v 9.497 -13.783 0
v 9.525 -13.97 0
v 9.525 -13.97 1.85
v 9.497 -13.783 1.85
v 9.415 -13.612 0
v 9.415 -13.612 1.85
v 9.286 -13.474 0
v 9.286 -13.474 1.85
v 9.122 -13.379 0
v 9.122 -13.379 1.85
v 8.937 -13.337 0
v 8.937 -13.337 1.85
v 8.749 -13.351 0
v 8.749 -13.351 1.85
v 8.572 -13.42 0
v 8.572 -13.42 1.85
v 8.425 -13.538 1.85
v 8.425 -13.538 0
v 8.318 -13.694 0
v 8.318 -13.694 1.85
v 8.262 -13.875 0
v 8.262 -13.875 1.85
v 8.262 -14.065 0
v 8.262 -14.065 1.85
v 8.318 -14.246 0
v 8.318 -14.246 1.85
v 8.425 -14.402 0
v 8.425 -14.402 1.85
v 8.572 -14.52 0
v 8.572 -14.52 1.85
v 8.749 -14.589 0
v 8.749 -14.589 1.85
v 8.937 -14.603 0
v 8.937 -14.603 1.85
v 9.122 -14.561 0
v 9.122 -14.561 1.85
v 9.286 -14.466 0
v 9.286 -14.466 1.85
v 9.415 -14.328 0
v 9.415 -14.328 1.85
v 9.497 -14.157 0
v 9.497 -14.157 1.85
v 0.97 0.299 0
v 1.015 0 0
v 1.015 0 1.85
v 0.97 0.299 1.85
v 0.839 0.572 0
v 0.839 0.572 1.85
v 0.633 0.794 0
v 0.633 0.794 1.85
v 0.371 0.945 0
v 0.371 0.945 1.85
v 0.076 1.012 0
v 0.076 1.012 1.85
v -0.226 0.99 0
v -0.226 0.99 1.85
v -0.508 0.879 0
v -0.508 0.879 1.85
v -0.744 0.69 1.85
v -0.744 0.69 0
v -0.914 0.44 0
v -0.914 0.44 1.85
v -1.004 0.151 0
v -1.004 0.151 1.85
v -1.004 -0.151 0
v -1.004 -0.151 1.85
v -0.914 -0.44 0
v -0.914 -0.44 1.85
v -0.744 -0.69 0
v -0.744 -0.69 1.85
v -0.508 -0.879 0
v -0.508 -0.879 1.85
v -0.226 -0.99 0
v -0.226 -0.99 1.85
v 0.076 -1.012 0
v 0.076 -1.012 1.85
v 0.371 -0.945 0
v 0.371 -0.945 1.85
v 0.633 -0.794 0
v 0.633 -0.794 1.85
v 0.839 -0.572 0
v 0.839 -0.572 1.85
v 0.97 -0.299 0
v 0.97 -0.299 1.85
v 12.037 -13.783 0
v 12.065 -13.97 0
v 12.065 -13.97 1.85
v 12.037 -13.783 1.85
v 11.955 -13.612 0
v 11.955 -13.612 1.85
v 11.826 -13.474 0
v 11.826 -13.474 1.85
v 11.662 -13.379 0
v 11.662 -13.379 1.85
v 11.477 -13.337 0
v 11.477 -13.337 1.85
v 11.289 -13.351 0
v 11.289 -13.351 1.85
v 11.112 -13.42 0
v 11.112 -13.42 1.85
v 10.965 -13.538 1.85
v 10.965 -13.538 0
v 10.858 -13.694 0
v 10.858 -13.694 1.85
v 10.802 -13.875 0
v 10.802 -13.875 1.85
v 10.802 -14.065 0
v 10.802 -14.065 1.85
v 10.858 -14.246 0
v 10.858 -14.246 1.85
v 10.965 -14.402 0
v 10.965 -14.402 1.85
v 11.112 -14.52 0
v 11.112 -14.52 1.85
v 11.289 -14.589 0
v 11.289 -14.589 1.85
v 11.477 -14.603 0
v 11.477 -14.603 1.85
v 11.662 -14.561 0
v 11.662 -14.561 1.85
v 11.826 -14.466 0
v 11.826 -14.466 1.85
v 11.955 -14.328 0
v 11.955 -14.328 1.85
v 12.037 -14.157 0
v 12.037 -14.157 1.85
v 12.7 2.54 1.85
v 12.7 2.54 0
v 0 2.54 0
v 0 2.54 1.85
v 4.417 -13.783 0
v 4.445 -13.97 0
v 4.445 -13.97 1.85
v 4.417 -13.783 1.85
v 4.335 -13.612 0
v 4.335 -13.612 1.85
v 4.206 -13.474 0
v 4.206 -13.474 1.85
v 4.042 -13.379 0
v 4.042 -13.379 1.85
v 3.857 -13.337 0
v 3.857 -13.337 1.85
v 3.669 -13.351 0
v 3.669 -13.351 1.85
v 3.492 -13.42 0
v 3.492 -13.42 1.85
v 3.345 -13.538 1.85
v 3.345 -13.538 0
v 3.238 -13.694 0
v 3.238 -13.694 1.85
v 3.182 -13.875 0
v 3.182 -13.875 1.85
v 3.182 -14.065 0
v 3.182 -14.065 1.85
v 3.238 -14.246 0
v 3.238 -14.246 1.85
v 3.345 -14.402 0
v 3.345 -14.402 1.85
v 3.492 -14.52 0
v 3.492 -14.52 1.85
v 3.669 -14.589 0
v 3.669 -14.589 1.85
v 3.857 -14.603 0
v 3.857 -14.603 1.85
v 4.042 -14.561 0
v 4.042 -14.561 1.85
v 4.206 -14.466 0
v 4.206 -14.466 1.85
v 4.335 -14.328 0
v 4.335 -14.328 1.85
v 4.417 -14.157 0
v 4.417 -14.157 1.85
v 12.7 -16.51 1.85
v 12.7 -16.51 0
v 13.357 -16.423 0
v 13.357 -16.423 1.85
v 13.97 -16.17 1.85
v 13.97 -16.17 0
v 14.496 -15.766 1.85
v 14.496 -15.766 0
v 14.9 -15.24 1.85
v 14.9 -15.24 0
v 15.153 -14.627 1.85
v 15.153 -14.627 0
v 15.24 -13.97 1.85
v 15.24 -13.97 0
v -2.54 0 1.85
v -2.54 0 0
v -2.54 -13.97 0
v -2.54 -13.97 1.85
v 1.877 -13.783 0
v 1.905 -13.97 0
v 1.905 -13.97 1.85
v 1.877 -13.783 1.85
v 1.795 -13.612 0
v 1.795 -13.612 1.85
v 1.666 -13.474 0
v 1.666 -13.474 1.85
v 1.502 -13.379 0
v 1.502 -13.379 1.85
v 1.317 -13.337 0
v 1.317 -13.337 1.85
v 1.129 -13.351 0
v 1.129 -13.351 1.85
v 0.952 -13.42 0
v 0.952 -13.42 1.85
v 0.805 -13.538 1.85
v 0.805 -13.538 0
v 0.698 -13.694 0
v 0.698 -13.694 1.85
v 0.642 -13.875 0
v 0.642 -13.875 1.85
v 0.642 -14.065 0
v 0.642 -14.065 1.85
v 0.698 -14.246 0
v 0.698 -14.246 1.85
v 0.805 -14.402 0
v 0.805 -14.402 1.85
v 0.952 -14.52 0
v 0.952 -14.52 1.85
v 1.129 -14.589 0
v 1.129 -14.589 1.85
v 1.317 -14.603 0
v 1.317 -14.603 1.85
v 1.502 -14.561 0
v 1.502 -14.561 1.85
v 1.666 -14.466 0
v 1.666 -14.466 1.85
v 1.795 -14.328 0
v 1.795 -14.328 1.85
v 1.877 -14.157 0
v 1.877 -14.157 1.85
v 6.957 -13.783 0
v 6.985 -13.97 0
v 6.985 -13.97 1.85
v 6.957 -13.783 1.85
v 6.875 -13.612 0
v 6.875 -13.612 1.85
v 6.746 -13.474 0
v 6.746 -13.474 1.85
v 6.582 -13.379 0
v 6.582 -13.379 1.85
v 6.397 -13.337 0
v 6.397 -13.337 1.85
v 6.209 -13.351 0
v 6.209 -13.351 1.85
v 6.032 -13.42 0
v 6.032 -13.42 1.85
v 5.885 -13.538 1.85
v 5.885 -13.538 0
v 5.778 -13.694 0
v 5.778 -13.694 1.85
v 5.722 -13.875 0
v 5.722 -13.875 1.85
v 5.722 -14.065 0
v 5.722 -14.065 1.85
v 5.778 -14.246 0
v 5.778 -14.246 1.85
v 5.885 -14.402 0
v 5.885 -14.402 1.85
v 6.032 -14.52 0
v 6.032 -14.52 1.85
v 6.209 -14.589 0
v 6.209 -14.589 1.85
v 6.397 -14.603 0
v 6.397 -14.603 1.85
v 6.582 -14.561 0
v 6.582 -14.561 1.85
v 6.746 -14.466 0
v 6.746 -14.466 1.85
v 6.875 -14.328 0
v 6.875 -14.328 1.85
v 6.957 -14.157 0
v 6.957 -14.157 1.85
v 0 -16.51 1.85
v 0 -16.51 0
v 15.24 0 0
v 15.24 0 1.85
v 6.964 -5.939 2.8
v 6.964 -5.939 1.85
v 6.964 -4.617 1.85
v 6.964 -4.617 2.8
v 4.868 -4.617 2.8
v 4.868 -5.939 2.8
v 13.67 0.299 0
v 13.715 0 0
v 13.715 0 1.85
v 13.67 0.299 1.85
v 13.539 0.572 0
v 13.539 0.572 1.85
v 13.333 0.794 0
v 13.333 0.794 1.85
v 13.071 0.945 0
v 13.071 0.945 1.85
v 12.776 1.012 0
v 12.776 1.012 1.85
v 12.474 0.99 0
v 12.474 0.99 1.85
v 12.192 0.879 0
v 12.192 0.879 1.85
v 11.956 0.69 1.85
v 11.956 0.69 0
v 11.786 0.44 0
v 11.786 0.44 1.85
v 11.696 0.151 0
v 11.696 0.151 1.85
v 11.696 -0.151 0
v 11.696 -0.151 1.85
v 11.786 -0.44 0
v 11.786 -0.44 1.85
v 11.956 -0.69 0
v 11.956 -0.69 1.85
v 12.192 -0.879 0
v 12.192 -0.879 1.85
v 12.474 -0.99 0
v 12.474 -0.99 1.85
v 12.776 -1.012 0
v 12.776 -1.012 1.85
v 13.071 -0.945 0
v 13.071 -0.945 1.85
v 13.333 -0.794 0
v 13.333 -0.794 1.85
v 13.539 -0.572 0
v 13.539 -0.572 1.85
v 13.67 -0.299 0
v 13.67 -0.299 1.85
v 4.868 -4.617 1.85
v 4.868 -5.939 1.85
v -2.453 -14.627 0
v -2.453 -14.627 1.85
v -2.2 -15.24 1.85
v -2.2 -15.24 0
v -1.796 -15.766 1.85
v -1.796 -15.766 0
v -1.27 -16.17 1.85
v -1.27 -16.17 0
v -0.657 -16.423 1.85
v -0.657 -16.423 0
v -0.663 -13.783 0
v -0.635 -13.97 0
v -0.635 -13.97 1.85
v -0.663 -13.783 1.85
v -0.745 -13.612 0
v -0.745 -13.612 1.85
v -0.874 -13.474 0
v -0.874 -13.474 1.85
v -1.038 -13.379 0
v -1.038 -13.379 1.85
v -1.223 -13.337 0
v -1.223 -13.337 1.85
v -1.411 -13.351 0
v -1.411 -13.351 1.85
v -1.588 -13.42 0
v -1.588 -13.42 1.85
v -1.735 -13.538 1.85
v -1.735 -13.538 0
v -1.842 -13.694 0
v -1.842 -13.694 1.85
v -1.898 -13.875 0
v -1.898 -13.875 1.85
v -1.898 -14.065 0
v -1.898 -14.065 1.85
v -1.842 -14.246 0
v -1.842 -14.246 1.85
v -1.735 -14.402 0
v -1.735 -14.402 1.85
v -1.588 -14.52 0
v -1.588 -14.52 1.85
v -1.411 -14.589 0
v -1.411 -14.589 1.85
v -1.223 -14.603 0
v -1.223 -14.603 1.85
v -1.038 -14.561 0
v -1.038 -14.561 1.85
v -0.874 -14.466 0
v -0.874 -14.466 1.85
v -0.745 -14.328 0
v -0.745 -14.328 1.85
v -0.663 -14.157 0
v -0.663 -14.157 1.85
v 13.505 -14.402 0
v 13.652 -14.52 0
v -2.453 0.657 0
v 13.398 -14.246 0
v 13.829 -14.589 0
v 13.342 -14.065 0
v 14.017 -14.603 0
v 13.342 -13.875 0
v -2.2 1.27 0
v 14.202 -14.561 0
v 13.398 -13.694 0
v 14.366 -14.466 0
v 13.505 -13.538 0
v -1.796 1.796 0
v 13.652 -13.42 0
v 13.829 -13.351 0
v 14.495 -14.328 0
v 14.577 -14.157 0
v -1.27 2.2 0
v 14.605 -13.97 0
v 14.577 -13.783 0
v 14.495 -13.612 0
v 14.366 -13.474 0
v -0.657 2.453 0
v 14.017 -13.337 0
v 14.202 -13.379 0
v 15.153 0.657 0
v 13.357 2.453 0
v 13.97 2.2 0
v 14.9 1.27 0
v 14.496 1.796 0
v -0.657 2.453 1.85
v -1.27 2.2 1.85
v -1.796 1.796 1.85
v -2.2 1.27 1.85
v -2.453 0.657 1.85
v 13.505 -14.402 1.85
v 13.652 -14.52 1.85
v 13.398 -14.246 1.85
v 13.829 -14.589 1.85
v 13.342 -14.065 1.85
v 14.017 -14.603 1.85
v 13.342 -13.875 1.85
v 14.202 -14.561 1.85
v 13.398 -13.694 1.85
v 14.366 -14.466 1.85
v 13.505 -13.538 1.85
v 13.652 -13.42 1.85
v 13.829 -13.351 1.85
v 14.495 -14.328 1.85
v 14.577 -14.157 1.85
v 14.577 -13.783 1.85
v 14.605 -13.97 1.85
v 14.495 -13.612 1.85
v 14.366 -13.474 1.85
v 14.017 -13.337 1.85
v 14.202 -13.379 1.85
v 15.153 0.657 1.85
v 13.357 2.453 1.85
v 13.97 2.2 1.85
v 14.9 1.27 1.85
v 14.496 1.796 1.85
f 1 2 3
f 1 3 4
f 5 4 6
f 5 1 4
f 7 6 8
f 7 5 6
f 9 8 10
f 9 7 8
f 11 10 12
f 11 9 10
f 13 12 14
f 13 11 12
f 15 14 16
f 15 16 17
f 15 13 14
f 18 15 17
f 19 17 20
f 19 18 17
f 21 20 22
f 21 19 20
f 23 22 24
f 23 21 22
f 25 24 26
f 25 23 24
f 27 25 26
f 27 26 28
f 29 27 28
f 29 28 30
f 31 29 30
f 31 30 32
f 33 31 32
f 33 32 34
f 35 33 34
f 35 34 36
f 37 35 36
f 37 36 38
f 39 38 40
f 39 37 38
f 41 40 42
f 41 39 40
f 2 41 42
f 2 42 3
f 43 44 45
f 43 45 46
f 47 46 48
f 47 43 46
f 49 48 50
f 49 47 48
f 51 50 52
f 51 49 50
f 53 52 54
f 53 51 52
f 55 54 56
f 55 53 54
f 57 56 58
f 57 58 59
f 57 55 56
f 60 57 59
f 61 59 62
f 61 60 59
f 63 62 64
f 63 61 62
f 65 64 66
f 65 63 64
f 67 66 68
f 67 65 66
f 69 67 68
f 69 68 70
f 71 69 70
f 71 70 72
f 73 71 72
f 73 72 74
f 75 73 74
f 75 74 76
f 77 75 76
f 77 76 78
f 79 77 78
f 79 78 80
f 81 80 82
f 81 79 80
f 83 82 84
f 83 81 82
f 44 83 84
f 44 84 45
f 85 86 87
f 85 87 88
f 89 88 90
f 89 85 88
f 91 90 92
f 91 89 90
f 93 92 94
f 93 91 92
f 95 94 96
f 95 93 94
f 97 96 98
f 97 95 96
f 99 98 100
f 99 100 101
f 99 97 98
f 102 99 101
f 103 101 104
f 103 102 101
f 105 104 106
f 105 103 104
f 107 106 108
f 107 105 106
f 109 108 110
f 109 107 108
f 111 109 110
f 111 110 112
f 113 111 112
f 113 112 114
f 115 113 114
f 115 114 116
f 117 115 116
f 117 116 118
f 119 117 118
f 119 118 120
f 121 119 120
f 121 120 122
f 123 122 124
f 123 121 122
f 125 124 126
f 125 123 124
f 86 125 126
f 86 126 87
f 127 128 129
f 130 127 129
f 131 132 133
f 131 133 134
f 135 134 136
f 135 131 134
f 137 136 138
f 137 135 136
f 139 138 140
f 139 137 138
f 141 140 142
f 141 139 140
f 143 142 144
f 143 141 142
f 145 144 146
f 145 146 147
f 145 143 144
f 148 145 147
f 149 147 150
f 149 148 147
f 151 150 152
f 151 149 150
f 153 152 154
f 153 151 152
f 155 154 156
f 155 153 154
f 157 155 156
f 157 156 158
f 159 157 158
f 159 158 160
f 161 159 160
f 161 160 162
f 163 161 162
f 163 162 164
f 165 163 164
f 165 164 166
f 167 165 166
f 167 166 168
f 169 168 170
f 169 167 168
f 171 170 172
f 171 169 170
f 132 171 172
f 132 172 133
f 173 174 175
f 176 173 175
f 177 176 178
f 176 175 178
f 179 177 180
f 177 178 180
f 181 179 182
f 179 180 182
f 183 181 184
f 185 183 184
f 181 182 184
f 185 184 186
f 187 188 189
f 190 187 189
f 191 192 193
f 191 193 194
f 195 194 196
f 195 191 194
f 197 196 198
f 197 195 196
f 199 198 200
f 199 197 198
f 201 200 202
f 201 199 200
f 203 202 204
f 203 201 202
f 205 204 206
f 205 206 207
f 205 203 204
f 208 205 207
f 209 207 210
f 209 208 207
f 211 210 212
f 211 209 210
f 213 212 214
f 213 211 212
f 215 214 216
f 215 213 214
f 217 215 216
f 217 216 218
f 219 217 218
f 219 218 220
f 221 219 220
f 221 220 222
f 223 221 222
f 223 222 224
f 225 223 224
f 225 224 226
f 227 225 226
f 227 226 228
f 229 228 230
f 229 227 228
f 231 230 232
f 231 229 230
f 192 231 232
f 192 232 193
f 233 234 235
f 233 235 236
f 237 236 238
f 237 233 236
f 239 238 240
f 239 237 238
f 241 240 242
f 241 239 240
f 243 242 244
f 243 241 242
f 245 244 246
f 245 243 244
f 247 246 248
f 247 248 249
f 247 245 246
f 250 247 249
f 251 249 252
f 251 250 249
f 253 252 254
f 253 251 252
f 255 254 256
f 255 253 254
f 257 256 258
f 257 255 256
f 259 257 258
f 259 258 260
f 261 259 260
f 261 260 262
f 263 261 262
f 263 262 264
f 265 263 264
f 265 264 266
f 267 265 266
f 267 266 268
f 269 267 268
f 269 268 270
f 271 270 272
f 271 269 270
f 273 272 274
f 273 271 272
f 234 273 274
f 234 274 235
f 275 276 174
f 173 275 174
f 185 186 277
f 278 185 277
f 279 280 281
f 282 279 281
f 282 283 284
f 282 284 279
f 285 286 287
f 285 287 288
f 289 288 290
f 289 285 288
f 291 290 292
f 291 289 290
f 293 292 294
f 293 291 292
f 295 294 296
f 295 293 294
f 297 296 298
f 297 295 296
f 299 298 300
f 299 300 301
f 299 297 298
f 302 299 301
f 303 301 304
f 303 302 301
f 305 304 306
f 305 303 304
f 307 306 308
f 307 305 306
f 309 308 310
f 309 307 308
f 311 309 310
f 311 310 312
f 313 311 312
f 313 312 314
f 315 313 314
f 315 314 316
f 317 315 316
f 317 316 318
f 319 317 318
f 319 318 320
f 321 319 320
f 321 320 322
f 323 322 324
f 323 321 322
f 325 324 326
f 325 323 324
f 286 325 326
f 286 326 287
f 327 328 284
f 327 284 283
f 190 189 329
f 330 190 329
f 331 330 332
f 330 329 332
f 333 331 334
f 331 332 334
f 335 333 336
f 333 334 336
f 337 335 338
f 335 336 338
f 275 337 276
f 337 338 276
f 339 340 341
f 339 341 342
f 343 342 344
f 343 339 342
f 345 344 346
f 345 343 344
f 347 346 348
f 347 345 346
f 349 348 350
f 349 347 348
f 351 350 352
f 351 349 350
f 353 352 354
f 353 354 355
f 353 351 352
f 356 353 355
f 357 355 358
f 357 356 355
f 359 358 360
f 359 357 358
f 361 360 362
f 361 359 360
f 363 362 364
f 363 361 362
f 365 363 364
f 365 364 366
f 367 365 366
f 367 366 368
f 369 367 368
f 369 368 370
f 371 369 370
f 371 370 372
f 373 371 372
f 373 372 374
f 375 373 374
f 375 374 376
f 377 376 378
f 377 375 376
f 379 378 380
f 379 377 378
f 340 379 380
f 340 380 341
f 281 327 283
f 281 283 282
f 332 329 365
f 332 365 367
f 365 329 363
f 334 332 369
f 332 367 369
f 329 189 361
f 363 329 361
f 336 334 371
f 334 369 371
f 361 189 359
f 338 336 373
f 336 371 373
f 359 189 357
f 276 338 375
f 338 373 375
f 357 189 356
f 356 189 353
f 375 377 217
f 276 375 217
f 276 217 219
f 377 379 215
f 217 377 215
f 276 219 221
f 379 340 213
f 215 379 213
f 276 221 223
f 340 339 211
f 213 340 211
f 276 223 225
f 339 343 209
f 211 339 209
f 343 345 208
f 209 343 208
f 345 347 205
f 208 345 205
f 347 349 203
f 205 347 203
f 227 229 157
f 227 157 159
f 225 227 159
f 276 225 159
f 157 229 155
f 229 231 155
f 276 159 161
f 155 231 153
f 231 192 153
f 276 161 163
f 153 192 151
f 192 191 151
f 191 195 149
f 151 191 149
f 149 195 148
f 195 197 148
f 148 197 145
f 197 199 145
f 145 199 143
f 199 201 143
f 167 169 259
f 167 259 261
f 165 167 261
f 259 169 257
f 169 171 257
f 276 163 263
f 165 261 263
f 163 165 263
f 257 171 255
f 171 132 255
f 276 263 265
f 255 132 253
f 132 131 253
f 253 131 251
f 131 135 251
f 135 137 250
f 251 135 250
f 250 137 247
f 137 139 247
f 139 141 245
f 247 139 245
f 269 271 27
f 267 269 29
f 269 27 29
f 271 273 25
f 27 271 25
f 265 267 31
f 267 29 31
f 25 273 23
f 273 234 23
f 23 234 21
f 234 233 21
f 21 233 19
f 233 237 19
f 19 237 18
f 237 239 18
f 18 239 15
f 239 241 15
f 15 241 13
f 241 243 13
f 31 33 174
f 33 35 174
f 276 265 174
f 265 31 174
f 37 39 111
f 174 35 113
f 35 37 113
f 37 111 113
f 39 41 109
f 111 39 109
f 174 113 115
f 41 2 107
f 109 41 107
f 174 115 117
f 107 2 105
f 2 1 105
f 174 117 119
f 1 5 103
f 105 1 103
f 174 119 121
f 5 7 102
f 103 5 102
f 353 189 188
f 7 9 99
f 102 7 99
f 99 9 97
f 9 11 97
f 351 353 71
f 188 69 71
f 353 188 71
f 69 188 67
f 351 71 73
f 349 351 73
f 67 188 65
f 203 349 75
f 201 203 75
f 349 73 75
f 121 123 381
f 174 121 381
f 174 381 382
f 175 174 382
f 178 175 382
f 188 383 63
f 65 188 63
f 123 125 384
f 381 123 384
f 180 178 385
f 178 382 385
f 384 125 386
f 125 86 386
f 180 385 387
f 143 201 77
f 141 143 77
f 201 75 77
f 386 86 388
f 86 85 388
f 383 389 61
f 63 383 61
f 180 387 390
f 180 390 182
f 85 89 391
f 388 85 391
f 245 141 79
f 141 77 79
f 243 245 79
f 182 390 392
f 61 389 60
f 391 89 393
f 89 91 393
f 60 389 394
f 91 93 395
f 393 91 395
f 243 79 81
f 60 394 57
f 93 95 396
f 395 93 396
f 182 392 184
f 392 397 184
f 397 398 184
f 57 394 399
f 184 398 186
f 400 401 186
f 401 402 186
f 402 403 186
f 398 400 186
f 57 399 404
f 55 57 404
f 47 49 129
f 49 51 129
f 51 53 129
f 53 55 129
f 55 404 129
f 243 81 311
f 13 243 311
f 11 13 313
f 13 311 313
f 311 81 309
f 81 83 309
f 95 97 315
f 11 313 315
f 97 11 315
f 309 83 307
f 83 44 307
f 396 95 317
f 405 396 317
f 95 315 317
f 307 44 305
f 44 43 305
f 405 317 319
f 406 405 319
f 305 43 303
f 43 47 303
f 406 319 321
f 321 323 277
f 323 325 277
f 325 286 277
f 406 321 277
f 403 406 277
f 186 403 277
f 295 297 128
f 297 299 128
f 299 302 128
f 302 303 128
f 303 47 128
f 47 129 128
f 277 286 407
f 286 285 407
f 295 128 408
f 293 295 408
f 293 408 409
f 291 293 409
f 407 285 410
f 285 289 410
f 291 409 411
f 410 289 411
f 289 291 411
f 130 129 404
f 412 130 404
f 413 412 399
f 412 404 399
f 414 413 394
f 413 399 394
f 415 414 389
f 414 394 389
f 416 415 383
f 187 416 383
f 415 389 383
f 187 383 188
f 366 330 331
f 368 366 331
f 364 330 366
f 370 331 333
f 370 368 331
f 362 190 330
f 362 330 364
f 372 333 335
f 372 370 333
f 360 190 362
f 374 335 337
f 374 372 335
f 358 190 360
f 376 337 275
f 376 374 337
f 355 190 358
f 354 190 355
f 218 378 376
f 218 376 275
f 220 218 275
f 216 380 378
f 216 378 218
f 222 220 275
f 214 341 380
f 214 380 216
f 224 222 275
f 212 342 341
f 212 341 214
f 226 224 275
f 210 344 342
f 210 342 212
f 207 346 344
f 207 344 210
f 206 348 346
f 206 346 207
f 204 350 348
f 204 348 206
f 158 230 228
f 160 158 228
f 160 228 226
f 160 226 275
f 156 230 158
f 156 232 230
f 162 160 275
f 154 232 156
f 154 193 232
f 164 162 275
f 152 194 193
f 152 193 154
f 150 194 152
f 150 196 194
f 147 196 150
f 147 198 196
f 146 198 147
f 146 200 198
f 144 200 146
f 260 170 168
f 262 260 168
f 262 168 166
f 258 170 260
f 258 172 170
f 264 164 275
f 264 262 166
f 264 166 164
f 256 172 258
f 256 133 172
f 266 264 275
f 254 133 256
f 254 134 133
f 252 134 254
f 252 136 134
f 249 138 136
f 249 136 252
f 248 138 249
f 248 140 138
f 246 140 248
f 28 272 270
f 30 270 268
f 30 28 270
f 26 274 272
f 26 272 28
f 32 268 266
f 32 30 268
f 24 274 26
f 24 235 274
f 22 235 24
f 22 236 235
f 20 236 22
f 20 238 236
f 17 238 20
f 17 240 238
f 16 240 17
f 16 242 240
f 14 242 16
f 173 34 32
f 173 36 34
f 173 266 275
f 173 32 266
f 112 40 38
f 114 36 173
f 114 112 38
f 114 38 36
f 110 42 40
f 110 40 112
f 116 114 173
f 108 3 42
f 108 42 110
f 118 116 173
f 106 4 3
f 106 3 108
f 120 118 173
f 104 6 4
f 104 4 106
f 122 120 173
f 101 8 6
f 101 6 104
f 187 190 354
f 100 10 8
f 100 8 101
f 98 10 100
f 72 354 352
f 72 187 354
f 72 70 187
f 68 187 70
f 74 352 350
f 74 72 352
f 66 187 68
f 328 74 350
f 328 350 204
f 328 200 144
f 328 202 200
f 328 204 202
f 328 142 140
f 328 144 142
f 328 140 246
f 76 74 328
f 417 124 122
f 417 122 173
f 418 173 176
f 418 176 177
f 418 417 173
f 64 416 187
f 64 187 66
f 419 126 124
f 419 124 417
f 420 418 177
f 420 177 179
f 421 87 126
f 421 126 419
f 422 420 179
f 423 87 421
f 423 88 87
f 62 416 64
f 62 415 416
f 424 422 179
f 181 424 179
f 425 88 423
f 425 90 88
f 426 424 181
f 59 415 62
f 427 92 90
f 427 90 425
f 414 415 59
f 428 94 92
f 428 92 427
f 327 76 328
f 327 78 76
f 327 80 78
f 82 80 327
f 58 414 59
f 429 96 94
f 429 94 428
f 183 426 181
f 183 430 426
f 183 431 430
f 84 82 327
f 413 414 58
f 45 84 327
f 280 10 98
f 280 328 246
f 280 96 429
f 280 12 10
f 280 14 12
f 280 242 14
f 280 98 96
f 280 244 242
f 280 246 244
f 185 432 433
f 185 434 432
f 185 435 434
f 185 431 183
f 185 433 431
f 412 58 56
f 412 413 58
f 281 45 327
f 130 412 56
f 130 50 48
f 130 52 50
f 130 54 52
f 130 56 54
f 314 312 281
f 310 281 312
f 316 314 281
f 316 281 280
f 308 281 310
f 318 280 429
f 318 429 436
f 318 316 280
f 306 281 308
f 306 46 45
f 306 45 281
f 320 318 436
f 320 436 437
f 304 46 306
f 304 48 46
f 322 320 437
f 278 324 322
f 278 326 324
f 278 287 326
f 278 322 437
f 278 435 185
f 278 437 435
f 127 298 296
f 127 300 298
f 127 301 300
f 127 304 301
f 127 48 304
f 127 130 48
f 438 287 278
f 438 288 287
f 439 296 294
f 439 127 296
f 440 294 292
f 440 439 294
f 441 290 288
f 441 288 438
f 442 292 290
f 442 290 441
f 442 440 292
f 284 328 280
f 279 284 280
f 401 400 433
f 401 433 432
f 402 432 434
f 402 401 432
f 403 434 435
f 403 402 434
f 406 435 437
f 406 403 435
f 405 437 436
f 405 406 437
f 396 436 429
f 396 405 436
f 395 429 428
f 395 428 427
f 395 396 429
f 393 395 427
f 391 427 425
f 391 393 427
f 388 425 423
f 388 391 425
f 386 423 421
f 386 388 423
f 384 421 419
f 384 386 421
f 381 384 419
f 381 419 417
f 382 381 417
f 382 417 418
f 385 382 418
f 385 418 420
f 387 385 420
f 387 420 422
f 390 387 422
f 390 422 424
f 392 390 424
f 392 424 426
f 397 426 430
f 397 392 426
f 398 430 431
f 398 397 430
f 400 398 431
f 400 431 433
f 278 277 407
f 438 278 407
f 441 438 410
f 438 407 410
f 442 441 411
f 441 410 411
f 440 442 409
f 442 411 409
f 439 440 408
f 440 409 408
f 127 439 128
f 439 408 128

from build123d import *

# Parameters (mm, degrees)
F0_R     = 0.635
F0_R_2   = 1.015
F1_DEPTH = 1.85
F2_W     = 2.096224
F2_H     = 1.321533
F3_DEPTH = 0.95


with BuildPart() as f1:
    # F0 (on Top) → F1 (new body)
    with BuildSketch(Plane.XY):
        with BuildLine():
            ThreePointArc((-2.54, -13.97), (-1.796051, -15.766051), (0, -16.51))
            Line((0, -16.51), (12.7, -16.51))
            ThreePointArc((12.7, -16.51), (14.496051, -15.766051), (15.24, -13.97))
            Line((15.24, -13.97), (15.24, 0))
            ThreePointArc((15.24, 0), (14.496051, 1.796051), (12.7, 2.54))
            Line((12.7, 2.54), (0, 2.54))
            ThreePointArc((0, 2.54), (-1.796051, 1.796051), (-2.54, 0))
            Line((-2.54, 0), (-2.54, -13.97))
        make_face()
        with Locations((-1.27, -13.97)):
            Circle(F0_R, mode=Mode.SUBTRACT)
        with Locations((1.27, -13.97)):
            Circle(F0_R, mode=Mode.SUBTRACT)
        with Locations((3.81, -13.97)):
            Circle(F0_R, mode=Mode.SUBTRACT)
        with Locations((6.35, -13.97)):
            Circle(F0_R, mode=Mode.SUBTRACT)
        with Locations((8.89, -13.97)):
            Circle(F0_R, mode=Mode.SUBTRACT)
        with Locations((11.43, -13.97)):
            Circle(F0_R, mode=Mode.SUBTRACT)
        with Locations((13.97, -13.97)):
            Circle(F0_R, mode=Mode.SUBTRACT)
        Circle(F0_R_2, mode=Mode.SUBTRACT)
        with Locations((12.7, 0)):
            Circle(F0_R_2, mode=Mode.SUBTRACT)
    extrude(amount=F1_DEPTH)

    # F2 (on face) → F3 (join)
    with BuildSketch(Plane.XY.offset(1.85)):
        with Locations((5.915654, -5.278095)):
            Rectangle(F2_W, F2_H)
    extrude(amount=F3_DEPTH)


solid = f1.part
